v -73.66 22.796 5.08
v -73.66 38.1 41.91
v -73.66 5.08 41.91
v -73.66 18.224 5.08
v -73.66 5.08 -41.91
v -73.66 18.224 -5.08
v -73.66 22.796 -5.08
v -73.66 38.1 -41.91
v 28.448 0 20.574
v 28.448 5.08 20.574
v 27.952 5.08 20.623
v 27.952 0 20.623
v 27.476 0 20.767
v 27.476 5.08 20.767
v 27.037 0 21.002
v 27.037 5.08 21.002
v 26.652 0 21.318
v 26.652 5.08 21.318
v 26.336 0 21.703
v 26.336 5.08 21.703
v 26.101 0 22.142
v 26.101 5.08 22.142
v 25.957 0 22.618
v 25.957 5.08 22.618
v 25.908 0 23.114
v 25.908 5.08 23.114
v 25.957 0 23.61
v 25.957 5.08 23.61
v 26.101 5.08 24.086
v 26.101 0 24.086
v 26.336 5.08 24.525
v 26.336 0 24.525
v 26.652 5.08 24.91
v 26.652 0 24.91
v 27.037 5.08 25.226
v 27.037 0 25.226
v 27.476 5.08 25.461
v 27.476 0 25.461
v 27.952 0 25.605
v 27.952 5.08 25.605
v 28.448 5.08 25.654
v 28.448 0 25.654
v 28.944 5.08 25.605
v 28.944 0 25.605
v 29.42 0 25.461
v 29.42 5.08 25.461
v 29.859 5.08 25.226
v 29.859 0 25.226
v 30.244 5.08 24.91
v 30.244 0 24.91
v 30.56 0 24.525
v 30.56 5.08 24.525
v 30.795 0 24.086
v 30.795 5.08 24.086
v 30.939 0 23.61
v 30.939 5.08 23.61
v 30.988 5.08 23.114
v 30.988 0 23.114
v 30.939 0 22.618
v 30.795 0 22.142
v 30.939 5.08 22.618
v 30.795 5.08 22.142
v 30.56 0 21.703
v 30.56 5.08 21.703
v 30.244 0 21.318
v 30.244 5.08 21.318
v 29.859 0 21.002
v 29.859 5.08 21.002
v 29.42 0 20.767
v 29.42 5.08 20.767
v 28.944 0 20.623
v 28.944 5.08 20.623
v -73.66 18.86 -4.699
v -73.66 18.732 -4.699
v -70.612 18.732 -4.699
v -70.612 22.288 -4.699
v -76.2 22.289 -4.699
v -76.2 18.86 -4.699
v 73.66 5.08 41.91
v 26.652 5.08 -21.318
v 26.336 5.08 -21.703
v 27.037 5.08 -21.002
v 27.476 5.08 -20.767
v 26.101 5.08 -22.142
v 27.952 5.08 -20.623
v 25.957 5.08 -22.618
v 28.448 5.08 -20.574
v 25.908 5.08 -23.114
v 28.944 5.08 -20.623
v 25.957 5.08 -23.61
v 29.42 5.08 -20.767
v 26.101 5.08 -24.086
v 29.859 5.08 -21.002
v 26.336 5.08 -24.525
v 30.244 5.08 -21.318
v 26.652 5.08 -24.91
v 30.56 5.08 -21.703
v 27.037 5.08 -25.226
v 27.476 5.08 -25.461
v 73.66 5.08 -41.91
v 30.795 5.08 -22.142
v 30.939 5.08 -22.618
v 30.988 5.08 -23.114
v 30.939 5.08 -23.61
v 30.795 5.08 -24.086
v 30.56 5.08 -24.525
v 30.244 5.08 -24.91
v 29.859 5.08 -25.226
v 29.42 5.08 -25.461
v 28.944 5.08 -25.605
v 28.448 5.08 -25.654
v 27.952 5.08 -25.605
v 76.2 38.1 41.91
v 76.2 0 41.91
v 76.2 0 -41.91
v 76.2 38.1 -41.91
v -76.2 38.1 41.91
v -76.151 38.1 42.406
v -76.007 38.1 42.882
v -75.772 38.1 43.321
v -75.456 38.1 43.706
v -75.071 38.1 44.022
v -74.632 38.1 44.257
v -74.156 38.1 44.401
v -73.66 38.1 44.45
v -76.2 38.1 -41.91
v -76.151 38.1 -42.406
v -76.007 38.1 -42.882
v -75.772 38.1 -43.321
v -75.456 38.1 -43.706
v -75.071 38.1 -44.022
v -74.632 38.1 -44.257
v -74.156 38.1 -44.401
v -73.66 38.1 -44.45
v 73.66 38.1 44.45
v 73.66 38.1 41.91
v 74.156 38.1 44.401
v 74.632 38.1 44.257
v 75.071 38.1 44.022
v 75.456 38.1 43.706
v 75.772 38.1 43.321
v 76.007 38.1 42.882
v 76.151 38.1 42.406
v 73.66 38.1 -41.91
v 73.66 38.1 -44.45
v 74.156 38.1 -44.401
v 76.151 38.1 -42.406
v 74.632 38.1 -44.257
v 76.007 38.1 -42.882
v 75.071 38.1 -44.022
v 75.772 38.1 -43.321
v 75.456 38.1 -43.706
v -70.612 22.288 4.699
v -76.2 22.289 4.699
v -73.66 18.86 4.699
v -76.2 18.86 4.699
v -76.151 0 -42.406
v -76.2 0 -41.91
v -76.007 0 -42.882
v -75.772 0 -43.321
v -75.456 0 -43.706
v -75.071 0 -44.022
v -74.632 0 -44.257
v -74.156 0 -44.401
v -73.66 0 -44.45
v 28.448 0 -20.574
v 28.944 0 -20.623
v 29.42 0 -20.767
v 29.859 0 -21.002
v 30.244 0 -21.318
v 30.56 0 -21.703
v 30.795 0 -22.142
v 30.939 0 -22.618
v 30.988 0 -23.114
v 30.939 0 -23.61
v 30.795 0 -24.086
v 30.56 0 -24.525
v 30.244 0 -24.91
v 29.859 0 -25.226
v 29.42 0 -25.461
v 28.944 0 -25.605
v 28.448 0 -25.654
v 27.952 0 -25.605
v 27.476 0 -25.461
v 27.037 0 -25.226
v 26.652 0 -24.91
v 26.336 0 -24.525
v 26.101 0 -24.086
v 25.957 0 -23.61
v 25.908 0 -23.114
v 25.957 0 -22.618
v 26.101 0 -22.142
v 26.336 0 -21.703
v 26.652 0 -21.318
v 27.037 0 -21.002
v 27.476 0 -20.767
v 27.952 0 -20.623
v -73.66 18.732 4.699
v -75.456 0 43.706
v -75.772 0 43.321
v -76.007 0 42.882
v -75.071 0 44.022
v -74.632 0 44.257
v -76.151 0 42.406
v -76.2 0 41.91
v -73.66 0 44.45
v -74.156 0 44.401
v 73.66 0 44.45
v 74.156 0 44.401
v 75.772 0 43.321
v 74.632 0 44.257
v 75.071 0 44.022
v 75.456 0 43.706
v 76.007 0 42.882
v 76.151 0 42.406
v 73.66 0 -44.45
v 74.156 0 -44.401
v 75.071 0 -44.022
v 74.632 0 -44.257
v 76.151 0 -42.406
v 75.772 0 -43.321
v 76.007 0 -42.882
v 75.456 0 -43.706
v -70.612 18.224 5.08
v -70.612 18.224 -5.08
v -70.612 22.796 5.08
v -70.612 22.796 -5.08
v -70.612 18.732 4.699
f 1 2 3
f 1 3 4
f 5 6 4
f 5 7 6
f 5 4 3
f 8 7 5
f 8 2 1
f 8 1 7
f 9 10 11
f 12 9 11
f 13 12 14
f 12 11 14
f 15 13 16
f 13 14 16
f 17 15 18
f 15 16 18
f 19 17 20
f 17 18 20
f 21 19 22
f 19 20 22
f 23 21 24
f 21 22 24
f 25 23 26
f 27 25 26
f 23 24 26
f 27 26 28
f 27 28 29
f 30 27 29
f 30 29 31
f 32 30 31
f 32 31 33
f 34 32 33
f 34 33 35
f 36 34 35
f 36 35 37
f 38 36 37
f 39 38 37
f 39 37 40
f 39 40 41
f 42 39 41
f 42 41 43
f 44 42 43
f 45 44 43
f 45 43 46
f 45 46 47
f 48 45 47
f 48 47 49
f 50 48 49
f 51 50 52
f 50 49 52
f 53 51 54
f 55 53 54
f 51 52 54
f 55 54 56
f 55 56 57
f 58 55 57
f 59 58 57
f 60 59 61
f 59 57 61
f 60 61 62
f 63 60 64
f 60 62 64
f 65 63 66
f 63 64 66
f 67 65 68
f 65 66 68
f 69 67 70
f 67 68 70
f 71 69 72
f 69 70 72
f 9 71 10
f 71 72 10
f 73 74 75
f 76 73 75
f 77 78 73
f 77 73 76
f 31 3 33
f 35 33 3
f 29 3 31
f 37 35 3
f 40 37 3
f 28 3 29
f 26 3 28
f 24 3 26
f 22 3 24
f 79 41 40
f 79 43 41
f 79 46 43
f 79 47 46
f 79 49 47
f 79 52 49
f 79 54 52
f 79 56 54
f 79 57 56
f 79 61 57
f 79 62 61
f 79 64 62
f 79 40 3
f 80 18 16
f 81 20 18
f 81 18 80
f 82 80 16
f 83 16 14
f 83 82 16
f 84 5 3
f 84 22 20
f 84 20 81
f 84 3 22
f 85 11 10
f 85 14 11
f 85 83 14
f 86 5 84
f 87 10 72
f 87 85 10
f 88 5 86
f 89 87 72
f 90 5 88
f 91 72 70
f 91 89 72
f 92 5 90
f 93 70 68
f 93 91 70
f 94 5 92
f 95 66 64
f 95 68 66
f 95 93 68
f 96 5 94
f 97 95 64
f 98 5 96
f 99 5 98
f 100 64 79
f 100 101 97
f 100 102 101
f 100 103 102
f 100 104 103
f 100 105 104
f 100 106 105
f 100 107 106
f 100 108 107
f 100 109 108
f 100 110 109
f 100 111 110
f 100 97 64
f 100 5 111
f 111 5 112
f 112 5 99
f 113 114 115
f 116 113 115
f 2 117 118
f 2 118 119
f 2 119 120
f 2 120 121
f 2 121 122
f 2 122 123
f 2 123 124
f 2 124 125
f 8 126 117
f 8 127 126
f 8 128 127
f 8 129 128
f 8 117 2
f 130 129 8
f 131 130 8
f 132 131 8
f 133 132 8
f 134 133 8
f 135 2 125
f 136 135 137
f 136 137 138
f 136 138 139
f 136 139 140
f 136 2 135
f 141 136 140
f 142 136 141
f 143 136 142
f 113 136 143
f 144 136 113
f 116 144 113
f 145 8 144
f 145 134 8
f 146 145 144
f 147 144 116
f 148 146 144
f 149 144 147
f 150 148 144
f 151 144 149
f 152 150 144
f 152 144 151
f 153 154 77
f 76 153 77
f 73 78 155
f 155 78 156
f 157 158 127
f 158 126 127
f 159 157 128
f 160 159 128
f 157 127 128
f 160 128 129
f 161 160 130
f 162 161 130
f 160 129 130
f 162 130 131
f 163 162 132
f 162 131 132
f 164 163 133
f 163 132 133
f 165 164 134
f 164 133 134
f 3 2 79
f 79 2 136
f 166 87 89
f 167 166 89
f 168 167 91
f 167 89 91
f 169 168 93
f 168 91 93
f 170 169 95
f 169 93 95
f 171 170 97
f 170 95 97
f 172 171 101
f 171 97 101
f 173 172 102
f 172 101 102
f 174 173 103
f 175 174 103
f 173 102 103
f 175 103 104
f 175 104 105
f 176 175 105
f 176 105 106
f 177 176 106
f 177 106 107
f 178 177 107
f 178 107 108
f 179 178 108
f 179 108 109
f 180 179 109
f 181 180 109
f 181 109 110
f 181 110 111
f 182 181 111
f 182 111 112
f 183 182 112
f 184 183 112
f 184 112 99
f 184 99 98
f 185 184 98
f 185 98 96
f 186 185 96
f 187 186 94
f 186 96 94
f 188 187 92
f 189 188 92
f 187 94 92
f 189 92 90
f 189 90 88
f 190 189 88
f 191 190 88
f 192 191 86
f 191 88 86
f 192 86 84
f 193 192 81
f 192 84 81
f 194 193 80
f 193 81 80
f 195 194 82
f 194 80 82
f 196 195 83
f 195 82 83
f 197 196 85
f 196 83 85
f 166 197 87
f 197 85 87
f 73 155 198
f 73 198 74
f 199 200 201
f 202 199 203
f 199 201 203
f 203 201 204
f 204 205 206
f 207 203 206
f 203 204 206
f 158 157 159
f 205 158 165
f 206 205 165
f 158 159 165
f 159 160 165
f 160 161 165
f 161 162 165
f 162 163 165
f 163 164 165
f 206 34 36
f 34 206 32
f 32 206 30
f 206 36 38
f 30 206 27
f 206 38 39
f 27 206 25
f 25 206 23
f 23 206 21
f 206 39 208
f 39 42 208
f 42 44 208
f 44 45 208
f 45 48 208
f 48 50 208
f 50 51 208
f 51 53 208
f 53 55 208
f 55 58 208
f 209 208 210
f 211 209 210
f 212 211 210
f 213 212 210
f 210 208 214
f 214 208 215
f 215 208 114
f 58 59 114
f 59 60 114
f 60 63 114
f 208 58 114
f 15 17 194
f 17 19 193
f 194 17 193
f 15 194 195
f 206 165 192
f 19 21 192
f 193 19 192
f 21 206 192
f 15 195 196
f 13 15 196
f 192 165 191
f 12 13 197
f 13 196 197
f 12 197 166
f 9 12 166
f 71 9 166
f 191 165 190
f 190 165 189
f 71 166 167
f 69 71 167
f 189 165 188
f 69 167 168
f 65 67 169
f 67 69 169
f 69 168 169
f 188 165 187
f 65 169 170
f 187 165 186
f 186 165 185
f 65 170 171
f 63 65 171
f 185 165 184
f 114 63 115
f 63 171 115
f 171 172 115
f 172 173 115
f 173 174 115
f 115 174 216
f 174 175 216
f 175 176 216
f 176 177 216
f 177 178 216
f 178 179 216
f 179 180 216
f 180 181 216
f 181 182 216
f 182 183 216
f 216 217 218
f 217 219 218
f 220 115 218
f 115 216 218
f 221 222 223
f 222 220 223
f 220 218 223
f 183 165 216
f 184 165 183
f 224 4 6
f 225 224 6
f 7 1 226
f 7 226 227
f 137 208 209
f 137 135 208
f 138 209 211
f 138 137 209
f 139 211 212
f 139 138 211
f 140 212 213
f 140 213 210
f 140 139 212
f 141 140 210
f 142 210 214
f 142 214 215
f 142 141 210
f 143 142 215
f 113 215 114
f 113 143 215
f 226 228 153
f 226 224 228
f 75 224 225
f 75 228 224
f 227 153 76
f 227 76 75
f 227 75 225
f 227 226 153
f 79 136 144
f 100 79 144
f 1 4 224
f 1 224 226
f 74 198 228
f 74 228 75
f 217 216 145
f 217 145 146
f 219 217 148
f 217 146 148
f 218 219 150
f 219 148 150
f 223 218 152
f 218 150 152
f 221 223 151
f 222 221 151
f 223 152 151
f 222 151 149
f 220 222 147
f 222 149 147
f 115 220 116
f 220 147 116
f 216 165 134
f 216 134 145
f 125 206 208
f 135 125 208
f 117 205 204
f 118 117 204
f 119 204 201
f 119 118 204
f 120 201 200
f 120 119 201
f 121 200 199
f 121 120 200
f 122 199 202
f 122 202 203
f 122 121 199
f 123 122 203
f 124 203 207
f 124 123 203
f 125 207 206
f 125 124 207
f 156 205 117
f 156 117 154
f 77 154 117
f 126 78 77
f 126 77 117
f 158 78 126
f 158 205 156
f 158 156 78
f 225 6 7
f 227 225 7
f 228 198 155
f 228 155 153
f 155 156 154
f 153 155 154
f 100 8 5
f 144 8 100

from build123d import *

# Parameters (mm, degrees)
SKETCH1_W           = 152.4
SKETCH1_H           = 88.9
BOSS_EXTRUDE1_DEPTH = 38.1
SKETCH2_W           = 147.32
SKETCH2_H           = 83.82
CUT_EXTRUDE1_DEPTH  = 33.02
SKETCH5_W           = 9.398
SKETCH5_H           = 3.429
CUT_EXTRUDE3_DEPTH  = 2.54
FILLET1_R           = 2.54
SKETCH6_R           = 2.54
CUT_EXTRUDE4_DEPTH  = 95.194282735
SKETCH7_W           = 10.16
SKETCH7_H           = 4.572
SKETCH7_W_2         = 9.398
SKETCH7_H_2         = 3.556
BOSS_EXTRUDE2_DEPTH = 3.048


with BuildPart() as part:
    # Sketch1 → Boss-Extrude1 (new body)
    with BuildSketch(Plane(origin=(0, 0, 0), x_dir=(1, 0, 0), z_dir=(0, 1, 0))):
        Rectangle(SKETCH1_W, SKETCH1_H)
    extrude(amount=BOSS_EXTRUDE1_DEPTH)

    # Sketch2 → Cut-Extrude1 (cut)
    with BuildSketch(Plane(origin=(0, 38.1, 0), x_dir=(1, 0, 0), z_dir=(0, 1, 0))):
        Rectangle(SKETCH2_W, SKETCH2_H)
    extrude(amount=-CUT_EXTRUDE1_DEPTH, mode=Mode.SUBTRACT)

    # Sketch5 → Cut-Extrude3 (cut)
    with BuildSketch(Plane.ZY.offset(76.2)):
        with Locations((0, 20.574)):
            Rectangle(SKETCH5_W, SKETCH5_H)
    extrude(amount=-CUT_EXTRUDE3_DEPTH, mode=Mode.SUBTRACT)

    # Fillet1
    fillet1_edges = [part.edges().sort_by_distance(p)[0] for p in [
        (76.2, 19.05, 44.45),
        (-76.2, 19.05, 44.45),
        (-76.2, 19.05, -44.45),
        (76.2, 19.05, -44.45),
    ]]
    fillet(fillet1_edges, radius=FILLET1_R)

    # Sketch6 → Cut-Extrude4 (cut, through all)
    with BuildSketch(Plane(origin=(0, 5.08, 0), x_dir=(1, 0, 0), z_dir=(0, 1, 0))):
        with Locations(Location((28.448, 23.114, 0), (0, 0, 270))):
            Circle(SKETCH6_R)
        with Locations(Location((28.448, -23.114, 0), (0, 0, 90))):
            Circle(SKETCH6_R)
    extrude(amount=-CUT_EXTRUDE4_DEPTH, mode=Mode.SUBTRACT)

    # Sketch7 → Boss-Extrude2 (add)
    with BuildSketch(Plane(origin=(-73.66, 0, 0), x_dir=(0, 0, -1), z_dir=(1, 0, 0))):
        with Locations((0, 20.5105)):
            Rectangle(SKETCH7_W, SKETCH7_H)
        with Locations((0, 20.5105)):
            Rectangle(SKETCH7_W_2, SKETCH7_H_2, mode=Mode.SUBTRACT)
    extrude(amount=BOSS_EXTRUDE2_DEPTH)


solid = part.part
